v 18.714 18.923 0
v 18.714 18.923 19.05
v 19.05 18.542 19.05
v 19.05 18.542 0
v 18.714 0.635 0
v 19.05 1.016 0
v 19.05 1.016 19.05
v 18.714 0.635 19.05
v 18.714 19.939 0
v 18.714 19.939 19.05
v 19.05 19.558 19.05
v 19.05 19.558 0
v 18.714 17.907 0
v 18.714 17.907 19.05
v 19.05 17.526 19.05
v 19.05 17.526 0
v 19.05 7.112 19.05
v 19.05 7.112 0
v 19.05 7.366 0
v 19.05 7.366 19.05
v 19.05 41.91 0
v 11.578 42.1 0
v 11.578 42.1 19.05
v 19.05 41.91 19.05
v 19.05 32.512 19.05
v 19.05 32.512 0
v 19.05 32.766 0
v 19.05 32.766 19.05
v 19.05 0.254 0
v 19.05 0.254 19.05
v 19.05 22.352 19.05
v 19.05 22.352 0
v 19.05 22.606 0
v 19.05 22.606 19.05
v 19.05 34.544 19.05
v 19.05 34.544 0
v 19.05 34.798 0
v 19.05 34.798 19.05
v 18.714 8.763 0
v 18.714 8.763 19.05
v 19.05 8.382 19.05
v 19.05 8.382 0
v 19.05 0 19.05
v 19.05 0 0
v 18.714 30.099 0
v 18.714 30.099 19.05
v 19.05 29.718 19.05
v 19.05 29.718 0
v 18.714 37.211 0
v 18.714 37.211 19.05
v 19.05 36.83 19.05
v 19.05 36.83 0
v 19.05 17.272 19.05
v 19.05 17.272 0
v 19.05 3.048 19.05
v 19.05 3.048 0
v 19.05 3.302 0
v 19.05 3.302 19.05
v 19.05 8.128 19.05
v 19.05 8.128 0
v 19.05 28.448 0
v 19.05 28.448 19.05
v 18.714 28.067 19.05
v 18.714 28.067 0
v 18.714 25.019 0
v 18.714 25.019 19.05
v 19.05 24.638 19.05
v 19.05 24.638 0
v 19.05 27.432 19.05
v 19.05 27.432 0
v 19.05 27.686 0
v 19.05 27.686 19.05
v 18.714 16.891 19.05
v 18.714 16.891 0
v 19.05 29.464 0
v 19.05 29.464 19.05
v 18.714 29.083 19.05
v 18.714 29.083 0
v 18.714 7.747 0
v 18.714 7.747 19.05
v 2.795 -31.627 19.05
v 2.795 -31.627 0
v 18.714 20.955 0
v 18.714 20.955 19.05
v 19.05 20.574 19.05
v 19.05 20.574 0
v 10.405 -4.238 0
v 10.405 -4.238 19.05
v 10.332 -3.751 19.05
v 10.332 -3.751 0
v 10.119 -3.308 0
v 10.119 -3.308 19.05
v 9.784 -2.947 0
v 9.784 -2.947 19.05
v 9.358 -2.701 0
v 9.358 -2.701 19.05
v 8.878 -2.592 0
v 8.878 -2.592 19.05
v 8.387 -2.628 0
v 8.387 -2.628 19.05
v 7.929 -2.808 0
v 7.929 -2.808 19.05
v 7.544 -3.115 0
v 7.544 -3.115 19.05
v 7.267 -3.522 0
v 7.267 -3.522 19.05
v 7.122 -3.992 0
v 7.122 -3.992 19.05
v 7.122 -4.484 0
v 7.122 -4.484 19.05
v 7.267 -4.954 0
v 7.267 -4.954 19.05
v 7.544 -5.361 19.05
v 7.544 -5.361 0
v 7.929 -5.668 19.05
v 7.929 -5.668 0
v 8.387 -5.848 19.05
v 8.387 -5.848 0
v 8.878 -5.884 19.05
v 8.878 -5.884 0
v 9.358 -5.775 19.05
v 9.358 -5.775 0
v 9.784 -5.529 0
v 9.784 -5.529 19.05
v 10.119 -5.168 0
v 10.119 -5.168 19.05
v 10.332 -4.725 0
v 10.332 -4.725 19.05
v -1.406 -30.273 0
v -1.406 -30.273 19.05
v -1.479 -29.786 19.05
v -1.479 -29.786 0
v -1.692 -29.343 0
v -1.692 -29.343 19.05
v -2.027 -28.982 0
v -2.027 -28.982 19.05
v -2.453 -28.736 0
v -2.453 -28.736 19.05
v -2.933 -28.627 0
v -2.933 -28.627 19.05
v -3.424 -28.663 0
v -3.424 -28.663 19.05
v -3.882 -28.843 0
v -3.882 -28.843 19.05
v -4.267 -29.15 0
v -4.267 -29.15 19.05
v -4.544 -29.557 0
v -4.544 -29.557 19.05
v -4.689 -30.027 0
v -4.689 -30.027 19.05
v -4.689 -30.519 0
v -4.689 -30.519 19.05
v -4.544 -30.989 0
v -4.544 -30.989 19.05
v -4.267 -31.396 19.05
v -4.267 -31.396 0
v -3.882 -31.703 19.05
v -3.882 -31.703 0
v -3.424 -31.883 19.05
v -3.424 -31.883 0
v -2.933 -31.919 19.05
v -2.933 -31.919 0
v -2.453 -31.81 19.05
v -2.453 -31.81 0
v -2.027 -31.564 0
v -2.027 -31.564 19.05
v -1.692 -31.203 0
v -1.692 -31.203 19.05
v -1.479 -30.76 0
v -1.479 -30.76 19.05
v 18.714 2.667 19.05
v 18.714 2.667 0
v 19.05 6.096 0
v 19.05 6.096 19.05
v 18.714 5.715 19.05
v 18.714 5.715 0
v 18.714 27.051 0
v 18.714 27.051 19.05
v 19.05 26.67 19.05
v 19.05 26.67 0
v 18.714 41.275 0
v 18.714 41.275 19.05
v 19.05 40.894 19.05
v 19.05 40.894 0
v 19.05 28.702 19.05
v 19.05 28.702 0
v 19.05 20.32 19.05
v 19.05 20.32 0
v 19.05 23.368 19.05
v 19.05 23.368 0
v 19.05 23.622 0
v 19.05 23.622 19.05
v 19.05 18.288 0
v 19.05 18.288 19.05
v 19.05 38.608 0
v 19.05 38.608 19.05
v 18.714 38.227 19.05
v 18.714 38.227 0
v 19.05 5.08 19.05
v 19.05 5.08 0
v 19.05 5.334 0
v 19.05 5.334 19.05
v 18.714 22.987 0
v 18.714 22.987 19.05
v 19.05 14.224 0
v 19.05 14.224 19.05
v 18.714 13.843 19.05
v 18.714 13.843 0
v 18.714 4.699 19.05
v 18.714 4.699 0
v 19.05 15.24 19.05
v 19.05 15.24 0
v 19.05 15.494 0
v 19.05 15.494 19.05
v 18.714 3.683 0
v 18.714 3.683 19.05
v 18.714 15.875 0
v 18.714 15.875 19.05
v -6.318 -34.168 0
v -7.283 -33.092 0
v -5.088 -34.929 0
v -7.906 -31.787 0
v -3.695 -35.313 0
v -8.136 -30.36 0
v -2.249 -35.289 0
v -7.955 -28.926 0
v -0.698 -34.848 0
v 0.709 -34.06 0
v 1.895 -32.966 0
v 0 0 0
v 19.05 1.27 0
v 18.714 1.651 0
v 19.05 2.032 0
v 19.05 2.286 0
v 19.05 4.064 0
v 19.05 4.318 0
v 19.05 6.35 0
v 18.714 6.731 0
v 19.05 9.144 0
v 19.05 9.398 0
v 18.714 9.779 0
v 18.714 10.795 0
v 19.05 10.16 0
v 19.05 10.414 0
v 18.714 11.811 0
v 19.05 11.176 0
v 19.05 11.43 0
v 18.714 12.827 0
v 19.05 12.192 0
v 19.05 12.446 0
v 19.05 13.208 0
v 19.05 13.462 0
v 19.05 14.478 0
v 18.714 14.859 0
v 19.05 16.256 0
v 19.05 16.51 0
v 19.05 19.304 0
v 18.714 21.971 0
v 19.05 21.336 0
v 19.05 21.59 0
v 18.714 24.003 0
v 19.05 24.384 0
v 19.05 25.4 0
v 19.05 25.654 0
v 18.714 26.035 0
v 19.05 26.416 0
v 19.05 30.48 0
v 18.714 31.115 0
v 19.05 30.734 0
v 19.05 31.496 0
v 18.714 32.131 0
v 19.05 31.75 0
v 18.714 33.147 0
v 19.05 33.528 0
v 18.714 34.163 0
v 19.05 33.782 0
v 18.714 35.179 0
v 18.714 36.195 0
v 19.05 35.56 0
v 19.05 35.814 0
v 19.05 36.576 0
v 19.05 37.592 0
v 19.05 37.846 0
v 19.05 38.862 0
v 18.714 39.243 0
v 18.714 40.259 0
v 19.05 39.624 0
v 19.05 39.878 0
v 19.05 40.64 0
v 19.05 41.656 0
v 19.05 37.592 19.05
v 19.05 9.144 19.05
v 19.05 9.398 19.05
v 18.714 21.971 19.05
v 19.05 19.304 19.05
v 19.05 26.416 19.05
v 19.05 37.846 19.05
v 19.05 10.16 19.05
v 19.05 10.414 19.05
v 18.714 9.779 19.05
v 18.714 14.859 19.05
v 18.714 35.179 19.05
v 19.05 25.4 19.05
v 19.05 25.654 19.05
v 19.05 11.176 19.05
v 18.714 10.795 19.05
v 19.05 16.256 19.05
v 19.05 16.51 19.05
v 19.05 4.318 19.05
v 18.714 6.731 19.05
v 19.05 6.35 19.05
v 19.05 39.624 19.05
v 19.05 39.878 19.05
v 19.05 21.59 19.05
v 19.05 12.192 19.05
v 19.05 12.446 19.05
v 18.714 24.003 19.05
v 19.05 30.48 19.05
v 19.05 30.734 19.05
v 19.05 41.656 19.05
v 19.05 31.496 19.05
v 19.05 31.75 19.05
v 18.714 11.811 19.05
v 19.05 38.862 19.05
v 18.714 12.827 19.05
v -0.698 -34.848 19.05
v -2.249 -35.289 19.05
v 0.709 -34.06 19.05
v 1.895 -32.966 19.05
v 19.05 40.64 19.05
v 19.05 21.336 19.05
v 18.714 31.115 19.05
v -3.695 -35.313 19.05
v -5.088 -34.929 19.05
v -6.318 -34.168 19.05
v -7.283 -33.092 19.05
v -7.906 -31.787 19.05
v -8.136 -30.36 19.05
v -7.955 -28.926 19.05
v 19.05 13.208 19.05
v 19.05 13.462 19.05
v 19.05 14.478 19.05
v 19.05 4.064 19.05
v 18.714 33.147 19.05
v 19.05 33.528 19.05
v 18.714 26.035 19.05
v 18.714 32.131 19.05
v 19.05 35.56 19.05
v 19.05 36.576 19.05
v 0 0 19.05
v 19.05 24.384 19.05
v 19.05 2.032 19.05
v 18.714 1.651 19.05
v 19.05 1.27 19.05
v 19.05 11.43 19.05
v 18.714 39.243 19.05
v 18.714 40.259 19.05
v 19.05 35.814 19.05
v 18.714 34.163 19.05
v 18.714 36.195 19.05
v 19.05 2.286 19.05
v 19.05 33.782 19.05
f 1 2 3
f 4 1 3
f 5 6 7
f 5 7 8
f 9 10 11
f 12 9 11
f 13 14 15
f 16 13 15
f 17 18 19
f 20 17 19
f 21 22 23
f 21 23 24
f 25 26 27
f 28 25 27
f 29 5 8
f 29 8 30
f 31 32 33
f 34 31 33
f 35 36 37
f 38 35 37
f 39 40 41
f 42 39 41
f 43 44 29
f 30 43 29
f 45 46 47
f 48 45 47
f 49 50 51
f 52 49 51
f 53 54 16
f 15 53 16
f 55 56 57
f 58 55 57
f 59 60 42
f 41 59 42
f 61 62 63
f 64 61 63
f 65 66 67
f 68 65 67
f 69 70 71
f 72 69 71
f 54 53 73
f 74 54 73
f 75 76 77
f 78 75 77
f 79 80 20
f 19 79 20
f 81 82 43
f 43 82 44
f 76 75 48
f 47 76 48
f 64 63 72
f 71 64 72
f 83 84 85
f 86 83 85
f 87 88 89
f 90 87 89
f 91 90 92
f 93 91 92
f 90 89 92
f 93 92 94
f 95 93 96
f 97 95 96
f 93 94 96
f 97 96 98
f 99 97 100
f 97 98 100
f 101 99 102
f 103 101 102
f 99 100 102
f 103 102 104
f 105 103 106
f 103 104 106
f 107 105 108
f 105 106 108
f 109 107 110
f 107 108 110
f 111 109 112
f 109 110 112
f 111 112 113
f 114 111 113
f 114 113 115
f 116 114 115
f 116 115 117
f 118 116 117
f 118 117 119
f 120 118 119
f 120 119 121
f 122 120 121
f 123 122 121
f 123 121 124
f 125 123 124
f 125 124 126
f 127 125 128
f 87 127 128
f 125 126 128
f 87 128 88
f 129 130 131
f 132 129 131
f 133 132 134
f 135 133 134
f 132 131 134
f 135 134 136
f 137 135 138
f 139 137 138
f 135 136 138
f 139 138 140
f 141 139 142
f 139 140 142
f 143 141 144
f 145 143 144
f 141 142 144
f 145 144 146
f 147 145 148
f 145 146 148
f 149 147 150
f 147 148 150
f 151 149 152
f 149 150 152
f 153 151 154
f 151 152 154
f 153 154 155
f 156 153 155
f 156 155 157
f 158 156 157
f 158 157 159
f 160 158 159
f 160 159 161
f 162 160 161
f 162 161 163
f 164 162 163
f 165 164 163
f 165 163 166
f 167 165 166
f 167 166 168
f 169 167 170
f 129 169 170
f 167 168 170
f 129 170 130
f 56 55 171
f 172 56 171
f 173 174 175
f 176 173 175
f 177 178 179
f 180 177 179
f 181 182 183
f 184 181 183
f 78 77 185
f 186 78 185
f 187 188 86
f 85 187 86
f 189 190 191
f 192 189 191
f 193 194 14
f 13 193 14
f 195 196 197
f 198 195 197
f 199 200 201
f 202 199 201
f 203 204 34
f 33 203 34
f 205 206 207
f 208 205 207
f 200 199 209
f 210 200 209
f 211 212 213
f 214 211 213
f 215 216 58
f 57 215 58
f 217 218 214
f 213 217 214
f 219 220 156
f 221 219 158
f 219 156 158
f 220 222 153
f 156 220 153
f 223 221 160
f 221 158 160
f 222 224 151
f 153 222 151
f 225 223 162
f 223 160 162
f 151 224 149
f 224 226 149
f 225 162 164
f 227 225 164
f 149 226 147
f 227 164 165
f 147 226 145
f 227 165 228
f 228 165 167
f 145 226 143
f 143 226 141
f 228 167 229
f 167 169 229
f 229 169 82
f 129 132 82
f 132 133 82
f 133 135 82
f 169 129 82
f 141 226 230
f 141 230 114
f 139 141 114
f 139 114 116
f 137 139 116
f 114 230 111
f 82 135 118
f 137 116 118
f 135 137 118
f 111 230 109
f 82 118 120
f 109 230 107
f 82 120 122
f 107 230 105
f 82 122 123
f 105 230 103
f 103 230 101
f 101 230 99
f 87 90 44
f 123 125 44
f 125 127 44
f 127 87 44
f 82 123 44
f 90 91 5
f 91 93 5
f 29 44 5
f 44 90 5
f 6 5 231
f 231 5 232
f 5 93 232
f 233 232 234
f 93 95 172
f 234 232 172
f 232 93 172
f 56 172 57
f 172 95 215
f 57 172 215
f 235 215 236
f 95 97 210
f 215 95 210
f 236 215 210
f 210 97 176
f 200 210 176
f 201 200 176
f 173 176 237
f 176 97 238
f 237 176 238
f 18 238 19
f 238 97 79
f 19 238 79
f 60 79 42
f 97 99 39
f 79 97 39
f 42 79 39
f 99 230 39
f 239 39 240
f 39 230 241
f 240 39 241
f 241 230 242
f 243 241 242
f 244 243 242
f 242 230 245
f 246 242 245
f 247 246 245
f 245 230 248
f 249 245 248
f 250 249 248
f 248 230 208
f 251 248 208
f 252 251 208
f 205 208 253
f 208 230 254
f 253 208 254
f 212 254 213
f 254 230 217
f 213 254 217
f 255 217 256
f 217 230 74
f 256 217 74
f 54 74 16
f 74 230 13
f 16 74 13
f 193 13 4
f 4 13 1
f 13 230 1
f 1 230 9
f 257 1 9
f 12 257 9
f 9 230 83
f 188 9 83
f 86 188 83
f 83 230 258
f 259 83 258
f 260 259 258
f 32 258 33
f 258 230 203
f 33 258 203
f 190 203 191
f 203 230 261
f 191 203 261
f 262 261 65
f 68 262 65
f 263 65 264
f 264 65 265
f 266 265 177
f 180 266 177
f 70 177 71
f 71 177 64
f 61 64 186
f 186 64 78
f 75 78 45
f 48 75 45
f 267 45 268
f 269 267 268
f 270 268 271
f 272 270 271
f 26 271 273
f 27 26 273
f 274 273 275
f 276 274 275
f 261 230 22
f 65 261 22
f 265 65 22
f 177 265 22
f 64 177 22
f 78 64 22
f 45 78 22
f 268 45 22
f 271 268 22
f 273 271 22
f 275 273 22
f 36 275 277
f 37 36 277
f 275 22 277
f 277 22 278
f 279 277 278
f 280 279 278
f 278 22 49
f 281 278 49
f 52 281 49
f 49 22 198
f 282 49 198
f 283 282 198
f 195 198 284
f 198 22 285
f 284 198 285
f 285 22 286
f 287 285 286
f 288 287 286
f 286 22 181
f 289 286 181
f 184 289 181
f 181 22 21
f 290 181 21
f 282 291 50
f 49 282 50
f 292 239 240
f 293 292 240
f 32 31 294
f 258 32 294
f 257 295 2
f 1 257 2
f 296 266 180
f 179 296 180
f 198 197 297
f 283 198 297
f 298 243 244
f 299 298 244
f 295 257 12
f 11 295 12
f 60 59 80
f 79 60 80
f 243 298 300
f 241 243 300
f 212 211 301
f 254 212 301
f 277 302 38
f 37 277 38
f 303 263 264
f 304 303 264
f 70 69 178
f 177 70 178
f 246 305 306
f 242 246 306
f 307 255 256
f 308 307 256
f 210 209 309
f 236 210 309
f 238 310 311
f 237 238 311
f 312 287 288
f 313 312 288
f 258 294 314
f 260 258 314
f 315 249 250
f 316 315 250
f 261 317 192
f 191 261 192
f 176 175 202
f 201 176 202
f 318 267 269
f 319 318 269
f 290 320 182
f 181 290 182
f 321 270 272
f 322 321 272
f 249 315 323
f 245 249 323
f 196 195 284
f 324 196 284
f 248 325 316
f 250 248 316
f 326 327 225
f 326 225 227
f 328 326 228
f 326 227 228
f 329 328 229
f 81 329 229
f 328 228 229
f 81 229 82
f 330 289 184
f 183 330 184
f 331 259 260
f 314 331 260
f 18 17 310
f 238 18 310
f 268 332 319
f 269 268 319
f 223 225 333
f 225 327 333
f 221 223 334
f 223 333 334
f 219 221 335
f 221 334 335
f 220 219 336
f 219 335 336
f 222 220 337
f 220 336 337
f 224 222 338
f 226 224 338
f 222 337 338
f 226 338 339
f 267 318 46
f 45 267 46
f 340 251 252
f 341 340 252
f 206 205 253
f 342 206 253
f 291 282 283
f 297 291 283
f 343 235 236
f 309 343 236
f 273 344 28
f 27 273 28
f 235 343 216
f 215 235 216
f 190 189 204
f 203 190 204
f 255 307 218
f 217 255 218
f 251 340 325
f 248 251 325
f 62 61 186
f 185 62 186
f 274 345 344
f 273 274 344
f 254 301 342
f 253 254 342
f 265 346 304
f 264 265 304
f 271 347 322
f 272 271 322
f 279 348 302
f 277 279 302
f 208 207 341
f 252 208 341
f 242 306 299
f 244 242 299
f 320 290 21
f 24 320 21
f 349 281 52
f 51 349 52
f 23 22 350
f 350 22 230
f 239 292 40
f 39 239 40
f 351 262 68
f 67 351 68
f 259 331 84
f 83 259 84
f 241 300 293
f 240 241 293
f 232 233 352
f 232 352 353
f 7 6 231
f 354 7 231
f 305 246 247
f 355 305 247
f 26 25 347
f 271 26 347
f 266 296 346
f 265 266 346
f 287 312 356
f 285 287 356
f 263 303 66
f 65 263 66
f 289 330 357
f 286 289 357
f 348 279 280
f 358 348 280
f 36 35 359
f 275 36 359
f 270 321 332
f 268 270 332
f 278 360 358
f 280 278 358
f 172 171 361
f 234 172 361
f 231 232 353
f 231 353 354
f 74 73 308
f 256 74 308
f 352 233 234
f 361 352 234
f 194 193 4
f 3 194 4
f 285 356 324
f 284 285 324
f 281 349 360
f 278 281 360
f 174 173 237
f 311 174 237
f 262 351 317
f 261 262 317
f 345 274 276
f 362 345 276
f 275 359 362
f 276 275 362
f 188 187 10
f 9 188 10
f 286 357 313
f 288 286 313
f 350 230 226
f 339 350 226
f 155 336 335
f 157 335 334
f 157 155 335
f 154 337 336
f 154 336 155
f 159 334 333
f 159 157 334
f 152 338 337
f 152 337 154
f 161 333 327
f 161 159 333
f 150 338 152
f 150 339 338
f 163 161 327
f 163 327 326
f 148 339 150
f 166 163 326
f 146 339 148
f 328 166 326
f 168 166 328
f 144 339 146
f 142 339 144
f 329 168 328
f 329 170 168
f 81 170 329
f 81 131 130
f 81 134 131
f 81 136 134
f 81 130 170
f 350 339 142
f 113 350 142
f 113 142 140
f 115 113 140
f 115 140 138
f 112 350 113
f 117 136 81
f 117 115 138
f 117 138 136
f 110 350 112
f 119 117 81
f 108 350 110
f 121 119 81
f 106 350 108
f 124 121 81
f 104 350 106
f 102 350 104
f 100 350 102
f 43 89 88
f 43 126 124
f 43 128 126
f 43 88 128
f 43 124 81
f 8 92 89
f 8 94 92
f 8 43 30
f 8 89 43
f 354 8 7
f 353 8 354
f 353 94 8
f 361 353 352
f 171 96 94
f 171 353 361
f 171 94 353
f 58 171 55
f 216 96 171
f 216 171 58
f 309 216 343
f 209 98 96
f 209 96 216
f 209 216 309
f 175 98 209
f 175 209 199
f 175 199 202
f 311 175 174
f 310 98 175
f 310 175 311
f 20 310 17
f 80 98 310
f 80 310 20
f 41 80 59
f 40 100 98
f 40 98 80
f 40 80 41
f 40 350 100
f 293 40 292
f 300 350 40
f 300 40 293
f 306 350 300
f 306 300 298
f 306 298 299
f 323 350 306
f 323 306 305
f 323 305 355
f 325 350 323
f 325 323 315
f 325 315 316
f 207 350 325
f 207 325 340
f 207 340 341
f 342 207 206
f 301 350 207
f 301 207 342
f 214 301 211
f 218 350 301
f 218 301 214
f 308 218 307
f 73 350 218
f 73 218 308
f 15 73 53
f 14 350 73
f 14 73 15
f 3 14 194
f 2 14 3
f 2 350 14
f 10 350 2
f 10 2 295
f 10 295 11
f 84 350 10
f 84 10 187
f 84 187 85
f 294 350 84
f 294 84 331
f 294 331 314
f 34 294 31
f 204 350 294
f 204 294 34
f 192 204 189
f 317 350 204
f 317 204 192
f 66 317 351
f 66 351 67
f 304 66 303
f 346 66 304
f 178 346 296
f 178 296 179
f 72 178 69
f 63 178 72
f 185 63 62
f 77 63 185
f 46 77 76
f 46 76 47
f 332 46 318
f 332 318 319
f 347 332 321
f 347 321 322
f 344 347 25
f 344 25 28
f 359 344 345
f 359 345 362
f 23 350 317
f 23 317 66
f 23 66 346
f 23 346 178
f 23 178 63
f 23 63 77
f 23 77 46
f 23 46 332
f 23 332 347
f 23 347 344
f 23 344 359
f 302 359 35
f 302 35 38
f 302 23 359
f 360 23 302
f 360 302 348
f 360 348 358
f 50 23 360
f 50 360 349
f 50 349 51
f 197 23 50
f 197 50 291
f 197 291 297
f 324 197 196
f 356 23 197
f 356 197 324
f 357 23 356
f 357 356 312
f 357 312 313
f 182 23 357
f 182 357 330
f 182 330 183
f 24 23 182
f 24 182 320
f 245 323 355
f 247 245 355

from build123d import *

# Parameters (mm, degrees)
F1_DEPTH = 19.05
F3_DEPTH = 19.05
F4_R     = 5.08
F5_R     = 1.651
F6_DEPTH = 19.05
F8_DEPTH = 19.051


with BuildPart() as f1:
    # F0 (on Top) → F1 (new body)
    with BuildSketch(Plane.XY):
        with BuildLine():
            Line((2.7951651794, -31.627423938), (19.05, 0))
            Line((19.05, 0), (19.05, 63.5))
            Line((19.05, 63.5), (17.4625, 63.5))
            Line((17.4625, 63.5), (0, 0))
            Line((0, 0), (-8.9422228719, -32.5171740795))
            ThreePointArc((-8.9422228719, -32.5171740795), (-2.8245693117, -35.3565183974), (2.7951651794, -31.627423938))
        make_face()
    extrude(amount=F1_DEPTH)

    # F2 (on face) → F3 (cut, through all)
    with BuildSketch(Plane.XY.offset(19.05)):
        Polygon((18.7139895835, 0.635), (19.05, 0.254), (19.05, 1.016), align=None)
        Polygon((19.05, 2.032), (18.7139895835, 1.651), (19.05, 1.27), align=None)
        Polygon((19.05, 3.048), (18.7139895835, 2.667), (19.05, 2.286), align=None)
        Polygon((19.05, 4.064), (18.7139895835, 3.683), (19.05, 3.302), align=None)
        Polygon((19.05, 5.08), (18.7139895835, 4.699), (19.05, 4.318), align=None)
        Polygon((19.05, 6.096), (18.7139895835, 5.715), (19.05, 5.334), align=None)
        Polygon((19.05, 7.112), (18.7139895835, 6.731), (19.05, 6.35), align=None)
        Polygon((19.05, 8.128), (18.7139895835, 7.747), (19.05, 7.366), align=None)
        Polygon((19.05, 9.144), (18.7139895835, 8.763), (19.05, 8.382), align=None)
        Polygon((19.05, 10.16), (18.7139895835, 9.779), (19.05, 9.398), align=None)
        Polygon((19.05, 11.176), (18.7139895835, 10.795), (19.05, 10.414), align=None)
        Polygon((19.05, 12.192), (18.7139895835, 11.811), (19.05, 11.43), align=None)
        Polygon((19.05, 13.208), (18.7139895835, 12.827), (19.05, 12.446), align=None)
        Polygon((19.05, 14.224), (18.7139895835, 13.843), (19.05, 13.462), align=None)
        Polygon((19.05, 15.24), (18.7139895835, 14.859), (19.05, 14.478), align=None)
        Polygon((19.05, 16.256), (18.7139895835, 15.875), (19.05, 15.494), align=None)
        Polygon((19.05, 17.272), (18.7139895835, 16.891), (19.05, 16.51), align=None)
        Polygon((19.05, 18.288), (18.7139895835, 17.907), (19.05, 17.526), align=None)
        Polygon((19.05, 19.304), (18.7139895835, 18.923), (19.05, 18.542), align=None)
        Polygon((19.05, 20.32), (18.7139895835, 19.939), (19.05, 19.558), align=None)
        Polygon((19.05, 21.336), (18.7139895835, 20.955), (19.05, 20.574), align=None)
        Polygon((19.05, 22.352), (18.7139895835, 21.971), (19.05, 21.59), align=None)
        Polygon((19.05, 23.368), (18.7139895835, 22.987), (19.05, 22.606), align=None)
        Polygon((19.05, 24.384), (18.7139895835, 24.003), (19.05, 23.622), align=None)
        Polygon((19.05, 25.4), (18.7139895835, 25.019), (19.05, 24.638), align=None)
        Polygon((19.05, 26.416), (18.7139895835, 26.035), (19.05, 25.654), align=None)
        Polygon((19.05, 27.432), (18.7139895835, 27.051), (19.05, 26.67), align=None)
        Polygon((19.05, 28.448), (18.7139895835, 28.067), (19.05, 27.686), align=None)
        Polygon((19.05, 29.464), (18.7139895835, 29.083), (19.05, 28.702), align=None)
        Polygon((19.05, 30.48), (18.7139895835, 30.099), (19.05, 29.718), align=None)
        Polygon((19.05, 31.496), (18.7139895835, 31.115), (19.05, 30.734), align=None)
        Polygon((19.05, 32.512), (18.7139895835, 32.131), (19.05, 31.75), align=None)
        Polygon((19.05, 33.528), (18.7139895835, 33.147), (19.05, 32.766), align=None)
        Polygon((19.05, 34.544), (18.7139895835, 34.163), (19.05, 33.782), align=None)
        Polygon((19.05, 35.56), (18.7139895835, 35.179), (19.05, 34.798), align=None)
        Polygon((19.05, 36.576), (18.7139895835, 36.195), (19.05, 35.814), align=None)
        Polygon((19.05, 37.592), (18.7139895835, 37.211), (19.05, 36.83), align=None)
        Polygon((19.05, 38.608), (18.7139895835, 38.227), (19.05, 37.846), align=None)
        Polygon((19.05, 39.624), (18.7139895835, 39.243), (19.05, 38.862), align=None)
        Polygon((19.05, 40.64), (18.7139895835, 40.259), (19.05, 39.878), align=None)
        Polygon((19.05, 41.656), (18.7139895835, 41.275), (19.05, 40.894), align=None)
        Polygon((19.05, 42.672), (18.7139895835, 42.291), (19.05, 41.91), align=None)
        Polygon((19.05, 43.688), (18.7139895835, 43.307), (19.05, 42.926), align=None)
        Polygon((19.05, 44.704), (18.7139895835, 44.323), (19.05, 43.942), align=None)
        Polygon((19.05, 45.72), (18.7139895835, 45.339), (19.05, 44.958), align=None)
        Polygon((19.05, 46.736), (18.7139895835, 46.355), (19.05, 45.974), align=None)
        Polygon((19.05, 47.752), (18.7139895835, 47.371), (19.05, 46.99), align=None)
        Polygon((19.05, 48.768), (18.7139895835, 48.387), (19.05, 48.006), align=None)
        Polygon((19.05, 49.784), (18.7139895835, 49.403), (19.05, 49.022), align=None)
        Polygon((19.05, 50.8), (18.7139895835, 50.419), (19.05, 50.038), align=None)
        Polygon((19.05, 51.816), (18.7139895835, 51.435), (19.05, 51.054), align=None)
        Polygon((19.05, 52.832), (18.7139895835, 52.451), (19.05, 52.07), align=None)
        Polygon((19.05, 53.848), (18.7139895835, 53.467), (19.05, 53.086), align=None)
        Polygon((19.05, 54.864), (18.7139895835, 54.483), (19.05, 54.102), align=None)
        Polygon((19.05, 55.88), (18.7139895835, 55.499), (19.05, 55.118), align=None)
        Polygon((19.05, 56.896), (18.7139895835, 56.515), (19.05, 56.134), align=None)
        Polygon((19.05, 57.912), (18.7139895835, 57.531), (19.05, 57.15), align=None)
        Polygon((19.05, 58.928), (18.7139895835, 58.547), (19.05, 58.166), align=None)
        Polygon((19.05, 59.944), (18.7139895835, 59.563), (19.05, 59.182), align=None)
        Polygon((19.05, 60.96), (18.7139895835, 60.579), (19.05, 60.198), align=None)
        Polygon((19.05, 61.976), (18.7139895835, 61.595), (19.05, 61.214), align=None)
        Polygon((19.05, 62.992), (18.7139895835, 62.611), (19.05, 62.23), align=None)
    extrude(amount=-F3_DEPTH, mode=Mode.SUBTRACT)

    # F4
    f4_edges = [f1.edges().sort_by_distance(p)[0] for p in [
        (-8.942223, -32.517174, 9.525),
    ]]
    fillet(f4_edges, radius=F4_R)

    # F5 (on face) → F6 (cut, through all)
    with BuildSketch(Plane.XY.offset(19.05)):
        with Locations((-3.0565118627, -30.2730867816)):
            Circle(F5_R)
        with Locations((8.7544881373, -4.2380867816)):
            Circle(F5_R)
    extrude(amount=-F6_DEPTH, mode=Mode.SUBTRACT)

    # F7 (on face) → F8 (cut, through all)
    with BuildSketch(Plane.XY.offset(19.05)):
        Polygon((19.05, 63.5), (17.4625, 63.5), (11.5776375, 42.1005), (19.05, 41.91), align=None)
    extrude(amount=-F8_DEPTH, mode=Mode.SUBTRACT)


solid = f1.part
